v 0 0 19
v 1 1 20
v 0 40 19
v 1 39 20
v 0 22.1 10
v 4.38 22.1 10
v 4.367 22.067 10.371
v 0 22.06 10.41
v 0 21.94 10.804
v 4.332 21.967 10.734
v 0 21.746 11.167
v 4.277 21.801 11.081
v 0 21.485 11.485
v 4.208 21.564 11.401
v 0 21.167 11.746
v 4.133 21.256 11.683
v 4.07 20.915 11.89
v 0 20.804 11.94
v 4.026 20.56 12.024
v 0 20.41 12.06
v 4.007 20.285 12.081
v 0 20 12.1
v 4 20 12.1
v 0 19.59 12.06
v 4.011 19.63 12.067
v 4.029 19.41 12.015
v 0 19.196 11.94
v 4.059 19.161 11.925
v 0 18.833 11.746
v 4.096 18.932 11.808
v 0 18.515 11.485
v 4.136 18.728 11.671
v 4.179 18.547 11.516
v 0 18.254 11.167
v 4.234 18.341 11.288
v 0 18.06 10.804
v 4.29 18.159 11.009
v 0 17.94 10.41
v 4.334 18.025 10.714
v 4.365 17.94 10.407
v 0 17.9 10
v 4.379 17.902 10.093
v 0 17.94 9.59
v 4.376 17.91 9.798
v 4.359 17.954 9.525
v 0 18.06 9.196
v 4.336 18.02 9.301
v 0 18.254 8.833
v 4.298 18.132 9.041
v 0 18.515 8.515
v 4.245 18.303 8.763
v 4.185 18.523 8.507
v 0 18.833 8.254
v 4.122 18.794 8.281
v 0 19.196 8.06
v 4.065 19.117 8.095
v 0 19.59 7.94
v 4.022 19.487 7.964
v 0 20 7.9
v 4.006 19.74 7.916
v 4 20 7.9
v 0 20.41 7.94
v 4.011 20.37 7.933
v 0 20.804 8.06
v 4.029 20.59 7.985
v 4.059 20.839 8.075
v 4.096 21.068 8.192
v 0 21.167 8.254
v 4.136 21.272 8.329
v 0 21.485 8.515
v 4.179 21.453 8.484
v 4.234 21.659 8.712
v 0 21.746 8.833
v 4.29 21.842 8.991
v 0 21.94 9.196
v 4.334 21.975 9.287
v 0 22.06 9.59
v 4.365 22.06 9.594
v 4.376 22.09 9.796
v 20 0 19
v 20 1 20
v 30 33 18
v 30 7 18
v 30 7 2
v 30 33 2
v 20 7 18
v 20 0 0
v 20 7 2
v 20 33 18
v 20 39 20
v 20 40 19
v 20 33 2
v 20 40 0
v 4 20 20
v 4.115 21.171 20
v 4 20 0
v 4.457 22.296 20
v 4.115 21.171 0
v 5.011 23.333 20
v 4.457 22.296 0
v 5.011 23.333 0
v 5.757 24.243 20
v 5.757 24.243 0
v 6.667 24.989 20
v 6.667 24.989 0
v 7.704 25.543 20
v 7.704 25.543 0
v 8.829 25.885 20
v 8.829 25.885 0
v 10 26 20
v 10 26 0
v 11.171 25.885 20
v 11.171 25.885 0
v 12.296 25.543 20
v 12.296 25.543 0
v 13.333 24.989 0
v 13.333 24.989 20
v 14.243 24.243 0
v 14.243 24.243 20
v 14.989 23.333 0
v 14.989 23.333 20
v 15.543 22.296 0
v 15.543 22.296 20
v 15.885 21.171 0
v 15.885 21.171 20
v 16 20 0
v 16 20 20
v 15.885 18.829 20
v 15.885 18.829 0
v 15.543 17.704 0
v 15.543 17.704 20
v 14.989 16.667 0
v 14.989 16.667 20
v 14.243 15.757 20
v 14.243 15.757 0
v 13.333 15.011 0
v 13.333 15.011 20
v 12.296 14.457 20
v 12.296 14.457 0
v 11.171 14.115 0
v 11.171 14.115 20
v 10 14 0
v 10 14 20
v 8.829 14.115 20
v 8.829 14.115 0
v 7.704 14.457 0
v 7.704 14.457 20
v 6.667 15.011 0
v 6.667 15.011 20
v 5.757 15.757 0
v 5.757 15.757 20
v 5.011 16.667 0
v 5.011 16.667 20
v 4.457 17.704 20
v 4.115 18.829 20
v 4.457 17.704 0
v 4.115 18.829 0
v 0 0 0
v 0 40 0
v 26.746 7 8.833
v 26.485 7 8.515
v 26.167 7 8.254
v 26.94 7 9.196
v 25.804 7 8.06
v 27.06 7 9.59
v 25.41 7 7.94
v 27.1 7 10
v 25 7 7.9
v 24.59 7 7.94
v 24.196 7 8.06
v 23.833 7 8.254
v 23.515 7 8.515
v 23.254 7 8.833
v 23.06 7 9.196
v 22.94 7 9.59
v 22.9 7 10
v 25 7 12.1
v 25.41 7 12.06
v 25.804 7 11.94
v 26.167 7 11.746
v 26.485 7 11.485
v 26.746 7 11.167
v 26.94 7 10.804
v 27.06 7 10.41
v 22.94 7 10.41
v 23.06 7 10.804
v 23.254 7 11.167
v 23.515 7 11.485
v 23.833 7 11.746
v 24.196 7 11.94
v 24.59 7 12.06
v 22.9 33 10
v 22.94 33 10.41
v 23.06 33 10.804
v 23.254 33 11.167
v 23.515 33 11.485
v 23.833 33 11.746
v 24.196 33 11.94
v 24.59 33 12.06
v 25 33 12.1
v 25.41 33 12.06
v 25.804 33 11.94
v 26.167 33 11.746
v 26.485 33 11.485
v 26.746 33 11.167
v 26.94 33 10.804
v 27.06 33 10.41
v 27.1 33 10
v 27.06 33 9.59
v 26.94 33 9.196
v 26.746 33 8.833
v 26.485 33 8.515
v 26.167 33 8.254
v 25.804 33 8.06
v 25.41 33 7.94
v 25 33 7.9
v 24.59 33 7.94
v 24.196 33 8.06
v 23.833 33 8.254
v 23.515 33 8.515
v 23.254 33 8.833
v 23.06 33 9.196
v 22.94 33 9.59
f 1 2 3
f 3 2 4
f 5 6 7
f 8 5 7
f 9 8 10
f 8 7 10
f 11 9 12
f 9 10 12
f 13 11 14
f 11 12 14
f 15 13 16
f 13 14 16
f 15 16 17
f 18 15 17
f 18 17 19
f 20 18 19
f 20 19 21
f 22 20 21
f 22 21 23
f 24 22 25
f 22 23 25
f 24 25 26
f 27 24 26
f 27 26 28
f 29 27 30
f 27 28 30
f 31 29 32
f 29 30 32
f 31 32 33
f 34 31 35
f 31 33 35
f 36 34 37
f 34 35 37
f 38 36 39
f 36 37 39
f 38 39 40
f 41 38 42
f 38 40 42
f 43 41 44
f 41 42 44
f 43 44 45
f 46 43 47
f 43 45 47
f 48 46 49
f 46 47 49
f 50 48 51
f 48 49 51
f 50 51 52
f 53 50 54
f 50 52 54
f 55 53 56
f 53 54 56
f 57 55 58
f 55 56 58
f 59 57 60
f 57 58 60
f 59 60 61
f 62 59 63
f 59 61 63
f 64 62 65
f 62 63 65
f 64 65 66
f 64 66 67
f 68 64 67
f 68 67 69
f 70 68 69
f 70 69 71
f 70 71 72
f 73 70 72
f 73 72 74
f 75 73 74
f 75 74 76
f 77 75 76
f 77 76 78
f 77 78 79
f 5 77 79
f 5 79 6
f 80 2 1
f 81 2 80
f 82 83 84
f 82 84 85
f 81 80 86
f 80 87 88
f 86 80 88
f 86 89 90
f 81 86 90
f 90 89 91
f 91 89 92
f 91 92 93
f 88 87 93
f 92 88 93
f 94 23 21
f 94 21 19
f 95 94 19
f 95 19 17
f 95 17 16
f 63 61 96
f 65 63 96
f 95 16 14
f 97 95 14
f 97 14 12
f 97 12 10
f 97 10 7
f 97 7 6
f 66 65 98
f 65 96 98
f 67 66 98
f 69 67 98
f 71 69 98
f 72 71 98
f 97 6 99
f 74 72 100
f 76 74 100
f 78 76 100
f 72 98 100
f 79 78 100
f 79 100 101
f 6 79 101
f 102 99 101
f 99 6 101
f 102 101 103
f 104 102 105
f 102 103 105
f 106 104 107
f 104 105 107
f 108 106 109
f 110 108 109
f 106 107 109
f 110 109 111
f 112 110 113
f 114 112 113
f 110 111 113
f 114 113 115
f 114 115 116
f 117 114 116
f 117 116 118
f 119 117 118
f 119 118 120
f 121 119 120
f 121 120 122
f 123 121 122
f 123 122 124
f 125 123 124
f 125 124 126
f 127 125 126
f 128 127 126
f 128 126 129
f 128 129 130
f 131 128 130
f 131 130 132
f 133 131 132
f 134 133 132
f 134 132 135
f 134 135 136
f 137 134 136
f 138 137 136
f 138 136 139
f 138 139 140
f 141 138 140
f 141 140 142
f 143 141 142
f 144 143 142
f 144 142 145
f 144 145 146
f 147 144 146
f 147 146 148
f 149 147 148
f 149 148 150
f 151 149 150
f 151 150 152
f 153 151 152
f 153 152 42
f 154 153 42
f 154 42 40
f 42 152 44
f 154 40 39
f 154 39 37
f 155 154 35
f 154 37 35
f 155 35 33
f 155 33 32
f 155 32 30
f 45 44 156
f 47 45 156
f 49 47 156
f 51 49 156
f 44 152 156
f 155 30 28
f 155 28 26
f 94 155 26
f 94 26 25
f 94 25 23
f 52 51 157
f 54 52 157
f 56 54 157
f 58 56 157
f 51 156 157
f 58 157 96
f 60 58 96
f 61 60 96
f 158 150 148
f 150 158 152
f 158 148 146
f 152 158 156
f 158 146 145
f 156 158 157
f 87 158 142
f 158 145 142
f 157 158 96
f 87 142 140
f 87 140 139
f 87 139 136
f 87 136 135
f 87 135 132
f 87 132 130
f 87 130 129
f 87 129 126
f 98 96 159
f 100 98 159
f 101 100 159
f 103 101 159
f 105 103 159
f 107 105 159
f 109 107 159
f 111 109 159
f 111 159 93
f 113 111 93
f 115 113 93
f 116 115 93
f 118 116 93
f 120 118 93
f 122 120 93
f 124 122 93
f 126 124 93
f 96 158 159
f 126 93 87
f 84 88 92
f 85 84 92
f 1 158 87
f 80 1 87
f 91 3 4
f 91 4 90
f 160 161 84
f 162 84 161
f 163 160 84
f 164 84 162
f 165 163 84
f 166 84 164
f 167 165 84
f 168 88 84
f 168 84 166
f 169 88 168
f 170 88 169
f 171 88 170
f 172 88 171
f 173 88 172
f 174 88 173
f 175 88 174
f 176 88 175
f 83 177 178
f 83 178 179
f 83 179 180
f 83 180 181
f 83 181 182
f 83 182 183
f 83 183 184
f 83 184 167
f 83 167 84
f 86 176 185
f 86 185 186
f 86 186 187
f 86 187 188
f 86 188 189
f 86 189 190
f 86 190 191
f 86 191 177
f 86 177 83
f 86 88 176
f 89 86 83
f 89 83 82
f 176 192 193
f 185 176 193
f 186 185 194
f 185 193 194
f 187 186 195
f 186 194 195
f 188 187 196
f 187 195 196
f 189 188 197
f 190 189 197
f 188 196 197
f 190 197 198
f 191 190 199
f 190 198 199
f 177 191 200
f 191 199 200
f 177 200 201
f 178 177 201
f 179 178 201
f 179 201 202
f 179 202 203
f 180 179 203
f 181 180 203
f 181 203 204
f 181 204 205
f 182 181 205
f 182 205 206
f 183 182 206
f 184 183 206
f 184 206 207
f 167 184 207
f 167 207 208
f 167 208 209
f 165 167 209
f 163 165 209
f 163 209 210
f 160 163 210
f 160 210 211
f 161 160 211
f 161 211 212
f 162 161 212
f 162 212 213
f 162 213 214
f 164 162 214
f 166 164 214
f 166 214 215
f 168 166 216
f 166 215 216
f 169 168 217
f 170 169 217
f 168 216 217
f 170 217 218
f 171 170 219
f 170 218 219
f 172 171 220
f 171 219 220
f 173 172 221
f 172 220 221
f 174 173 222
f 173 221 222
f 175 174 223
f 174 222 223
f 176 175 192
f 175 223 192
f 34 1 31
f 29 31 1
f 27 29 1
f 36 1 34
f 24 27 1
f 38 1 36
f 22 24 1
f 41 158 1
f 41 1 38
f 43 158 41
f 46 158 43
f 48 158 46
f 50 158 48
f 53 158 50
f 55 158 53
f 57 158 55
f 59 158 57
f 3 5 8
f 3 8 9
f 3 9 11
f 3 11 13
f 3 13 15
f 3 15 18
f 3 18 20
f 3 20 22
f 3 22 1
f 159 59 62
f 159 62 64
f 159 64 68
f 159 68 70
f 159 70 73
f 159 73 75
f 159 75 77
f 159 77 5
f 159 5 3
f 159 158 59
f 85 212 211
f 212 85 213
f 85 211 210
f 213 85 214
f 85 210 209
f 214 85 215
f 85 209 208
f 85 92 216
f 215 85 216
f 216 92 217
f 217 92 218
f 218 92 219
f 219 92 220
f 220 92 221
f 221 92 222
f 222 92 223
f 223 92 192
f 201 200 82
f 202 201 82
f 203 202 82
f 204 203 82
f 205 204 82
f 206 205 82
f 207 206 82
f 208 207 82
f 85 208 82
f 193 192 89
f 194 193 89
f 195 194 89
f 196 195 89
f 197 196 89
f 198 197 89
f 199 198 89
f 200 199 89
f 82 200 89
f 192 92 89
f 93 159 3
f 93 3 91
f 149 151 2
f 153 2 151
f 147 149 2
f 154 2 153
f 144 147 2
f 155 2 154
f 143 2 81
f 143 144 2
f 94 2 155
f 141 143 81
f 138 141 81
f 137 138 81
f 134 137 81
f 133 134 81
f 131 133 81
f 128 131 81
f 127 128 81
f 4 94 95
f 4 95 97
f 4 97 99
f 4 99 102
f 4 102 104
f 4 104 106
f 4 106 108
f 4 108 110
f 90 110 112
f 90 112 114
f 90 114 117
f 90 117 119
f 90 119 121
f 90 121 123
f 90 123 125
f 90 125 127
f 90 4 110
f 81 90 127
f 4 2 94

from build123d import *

# Parameters (mm, degrees)
F0_W      = 20
F0_H      = 40
F1_DEPTH  = 20
F3_D      = 12
F5_D      = 4.2
F5_DEPTH  = 5
F5_TIP    = 1.2618073
F8_SIZE   = 1
F9_W      = 26
F9_H      = 16
F10_DEPTH = 10
F12_D     = 4.2


# Not quite as in the source:
# - a feature of the source that left no trace in its solid (it failed there, or was rolled back) is left out


with BuildPart() as f1:
    # F0 (on Top) → F1 (new body)
    with BuildSketch(Plane.XY):
        with Locations((10, 20)):
            Rectangle(F0_W, F0_H)
    extrude(amount=F1_DEPTH)

    # F3 (through all)
    with Locations(Plane.XY.offset(20)):
        with Locations((10, 20)):
            Hole(F3_D / 2)

    # F5
    with Locations(Plane(origin=(0, 0, 0), x_dir=(0, -1, 0), z_dir=(-1, 0, 0))):
        with Locations((-20, 10)):
            Hole(F5_D / 2, depth=F5_DEPTH)
            with Locations((0, 0, -(F5_DEPTH + F5_TIP / 2))):  # 118° drill point
                Cone(0, F5_D / 2, F5_TIP, mode=Mode.SUBTRACT)

    # F8
    f8_edges = [f1.edges().sort_by_distance(p)[0] for p in [
        (10, 0, 20),
        (0, 20, 20),
        (10, 40, 20),
    ]]
    chamfer(f8_edges, length=F8_SIZE)

    # F9 (on face) → F10 (join)
    with BuildSketch(Plane.YZ.offset(20)):
        with Locations((20, 10)):
            Rectangle(F9_W, F9_H)
    extrude(amount=F10_DEPTH)

    # F12 (through all)
    with Locations(Plane.XZ.offset(-7)):
        with Locations((25, 10)):
            Hole(F12_D / 2)


solid = f1.part
